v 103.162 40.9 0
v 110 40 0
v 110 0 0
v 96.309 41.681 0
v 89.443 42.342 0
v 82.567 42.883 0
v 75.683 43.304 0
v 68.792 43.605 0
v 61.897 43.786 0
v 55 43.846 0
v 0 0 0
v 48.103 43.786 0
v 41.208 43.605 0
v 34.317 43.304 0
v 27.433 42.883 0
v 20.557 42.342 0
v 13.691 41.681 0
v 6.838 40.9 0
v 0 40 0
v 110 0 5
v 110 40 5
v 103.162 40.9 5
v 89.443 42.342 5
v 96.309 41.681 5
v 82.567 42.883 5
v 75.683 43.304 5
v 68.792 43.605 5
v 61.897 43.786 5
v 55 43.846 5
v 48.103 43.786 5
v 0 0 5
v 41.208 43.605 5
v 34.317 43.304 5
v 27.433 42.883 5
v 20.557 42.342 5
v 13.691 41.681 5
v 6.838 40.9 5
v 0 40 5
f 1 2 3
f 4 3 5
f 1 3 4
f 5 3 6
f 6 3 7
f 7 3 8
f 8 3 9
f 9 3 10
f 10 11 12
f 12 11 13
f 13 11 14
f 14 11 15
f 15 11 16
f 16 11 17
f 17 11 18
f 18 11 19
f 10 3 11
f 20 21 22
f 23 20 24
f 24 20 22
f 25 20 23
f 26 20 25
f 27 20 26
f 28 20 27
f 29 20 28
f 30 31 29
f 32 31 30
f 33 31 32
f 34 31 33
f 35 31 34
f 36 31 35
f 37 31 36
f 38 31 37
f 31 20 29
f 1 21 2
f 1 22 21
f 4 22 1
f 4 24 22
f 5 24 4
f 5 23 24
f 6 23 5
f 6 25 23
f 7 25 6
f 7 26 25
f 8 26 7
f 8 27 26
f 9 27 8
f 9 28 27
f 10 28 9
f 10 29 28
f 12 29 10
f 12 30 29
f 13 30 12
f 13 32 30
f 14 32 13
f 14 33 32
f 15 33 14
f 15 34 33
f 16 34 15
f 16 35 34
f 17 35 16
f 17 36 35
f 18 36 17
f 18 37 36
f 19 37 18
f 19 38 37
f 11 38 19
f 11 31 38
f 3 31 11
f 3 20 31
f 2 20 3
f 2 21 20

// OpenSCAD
$fn = 32;

// ----------------------------------------------------------------------
// Arc profile plate: crown, 19 points
// ----------------------------------------------------------------------

// --- parameters (mm) ---
bar_l = 110;              // bar length, X
bar_w = 40;               // bar height at the ends, Y
arc_r = 395.19;           // radius of the crown arc
arc_angle = 16;           // crown arc angle, degrees
crown_rise = 3.85;        // rise of the crown over the ends
arc_step = 1;             // sampling step of the crown arc, degrees
plate_t = 5;              // plate thickness, Z

bbox_y = bar_w + crown_rise;  // full height with the crown

profile = [[110, 40], [103.162, 40.9], [96.309, 41.681], [89.443, 42.342], [82.567, 42.883], [75.683, 43.304], [68.792, 43.605], [61.897, 43.786], [55, 43.846], [48.103, 43.786], [41.208, 43.605], [34.317, 43.304], [27.433, 42.883], [20.557, 42.342], [13.691, 41.681], [6.838, 40.9], [0, 40], [0, 0], [110, 0]];  // primary outline, 19 points, counter clockwise

// --- the one profile operation ---
linear_extrude(height = plate_t) polygon(points = profile);
